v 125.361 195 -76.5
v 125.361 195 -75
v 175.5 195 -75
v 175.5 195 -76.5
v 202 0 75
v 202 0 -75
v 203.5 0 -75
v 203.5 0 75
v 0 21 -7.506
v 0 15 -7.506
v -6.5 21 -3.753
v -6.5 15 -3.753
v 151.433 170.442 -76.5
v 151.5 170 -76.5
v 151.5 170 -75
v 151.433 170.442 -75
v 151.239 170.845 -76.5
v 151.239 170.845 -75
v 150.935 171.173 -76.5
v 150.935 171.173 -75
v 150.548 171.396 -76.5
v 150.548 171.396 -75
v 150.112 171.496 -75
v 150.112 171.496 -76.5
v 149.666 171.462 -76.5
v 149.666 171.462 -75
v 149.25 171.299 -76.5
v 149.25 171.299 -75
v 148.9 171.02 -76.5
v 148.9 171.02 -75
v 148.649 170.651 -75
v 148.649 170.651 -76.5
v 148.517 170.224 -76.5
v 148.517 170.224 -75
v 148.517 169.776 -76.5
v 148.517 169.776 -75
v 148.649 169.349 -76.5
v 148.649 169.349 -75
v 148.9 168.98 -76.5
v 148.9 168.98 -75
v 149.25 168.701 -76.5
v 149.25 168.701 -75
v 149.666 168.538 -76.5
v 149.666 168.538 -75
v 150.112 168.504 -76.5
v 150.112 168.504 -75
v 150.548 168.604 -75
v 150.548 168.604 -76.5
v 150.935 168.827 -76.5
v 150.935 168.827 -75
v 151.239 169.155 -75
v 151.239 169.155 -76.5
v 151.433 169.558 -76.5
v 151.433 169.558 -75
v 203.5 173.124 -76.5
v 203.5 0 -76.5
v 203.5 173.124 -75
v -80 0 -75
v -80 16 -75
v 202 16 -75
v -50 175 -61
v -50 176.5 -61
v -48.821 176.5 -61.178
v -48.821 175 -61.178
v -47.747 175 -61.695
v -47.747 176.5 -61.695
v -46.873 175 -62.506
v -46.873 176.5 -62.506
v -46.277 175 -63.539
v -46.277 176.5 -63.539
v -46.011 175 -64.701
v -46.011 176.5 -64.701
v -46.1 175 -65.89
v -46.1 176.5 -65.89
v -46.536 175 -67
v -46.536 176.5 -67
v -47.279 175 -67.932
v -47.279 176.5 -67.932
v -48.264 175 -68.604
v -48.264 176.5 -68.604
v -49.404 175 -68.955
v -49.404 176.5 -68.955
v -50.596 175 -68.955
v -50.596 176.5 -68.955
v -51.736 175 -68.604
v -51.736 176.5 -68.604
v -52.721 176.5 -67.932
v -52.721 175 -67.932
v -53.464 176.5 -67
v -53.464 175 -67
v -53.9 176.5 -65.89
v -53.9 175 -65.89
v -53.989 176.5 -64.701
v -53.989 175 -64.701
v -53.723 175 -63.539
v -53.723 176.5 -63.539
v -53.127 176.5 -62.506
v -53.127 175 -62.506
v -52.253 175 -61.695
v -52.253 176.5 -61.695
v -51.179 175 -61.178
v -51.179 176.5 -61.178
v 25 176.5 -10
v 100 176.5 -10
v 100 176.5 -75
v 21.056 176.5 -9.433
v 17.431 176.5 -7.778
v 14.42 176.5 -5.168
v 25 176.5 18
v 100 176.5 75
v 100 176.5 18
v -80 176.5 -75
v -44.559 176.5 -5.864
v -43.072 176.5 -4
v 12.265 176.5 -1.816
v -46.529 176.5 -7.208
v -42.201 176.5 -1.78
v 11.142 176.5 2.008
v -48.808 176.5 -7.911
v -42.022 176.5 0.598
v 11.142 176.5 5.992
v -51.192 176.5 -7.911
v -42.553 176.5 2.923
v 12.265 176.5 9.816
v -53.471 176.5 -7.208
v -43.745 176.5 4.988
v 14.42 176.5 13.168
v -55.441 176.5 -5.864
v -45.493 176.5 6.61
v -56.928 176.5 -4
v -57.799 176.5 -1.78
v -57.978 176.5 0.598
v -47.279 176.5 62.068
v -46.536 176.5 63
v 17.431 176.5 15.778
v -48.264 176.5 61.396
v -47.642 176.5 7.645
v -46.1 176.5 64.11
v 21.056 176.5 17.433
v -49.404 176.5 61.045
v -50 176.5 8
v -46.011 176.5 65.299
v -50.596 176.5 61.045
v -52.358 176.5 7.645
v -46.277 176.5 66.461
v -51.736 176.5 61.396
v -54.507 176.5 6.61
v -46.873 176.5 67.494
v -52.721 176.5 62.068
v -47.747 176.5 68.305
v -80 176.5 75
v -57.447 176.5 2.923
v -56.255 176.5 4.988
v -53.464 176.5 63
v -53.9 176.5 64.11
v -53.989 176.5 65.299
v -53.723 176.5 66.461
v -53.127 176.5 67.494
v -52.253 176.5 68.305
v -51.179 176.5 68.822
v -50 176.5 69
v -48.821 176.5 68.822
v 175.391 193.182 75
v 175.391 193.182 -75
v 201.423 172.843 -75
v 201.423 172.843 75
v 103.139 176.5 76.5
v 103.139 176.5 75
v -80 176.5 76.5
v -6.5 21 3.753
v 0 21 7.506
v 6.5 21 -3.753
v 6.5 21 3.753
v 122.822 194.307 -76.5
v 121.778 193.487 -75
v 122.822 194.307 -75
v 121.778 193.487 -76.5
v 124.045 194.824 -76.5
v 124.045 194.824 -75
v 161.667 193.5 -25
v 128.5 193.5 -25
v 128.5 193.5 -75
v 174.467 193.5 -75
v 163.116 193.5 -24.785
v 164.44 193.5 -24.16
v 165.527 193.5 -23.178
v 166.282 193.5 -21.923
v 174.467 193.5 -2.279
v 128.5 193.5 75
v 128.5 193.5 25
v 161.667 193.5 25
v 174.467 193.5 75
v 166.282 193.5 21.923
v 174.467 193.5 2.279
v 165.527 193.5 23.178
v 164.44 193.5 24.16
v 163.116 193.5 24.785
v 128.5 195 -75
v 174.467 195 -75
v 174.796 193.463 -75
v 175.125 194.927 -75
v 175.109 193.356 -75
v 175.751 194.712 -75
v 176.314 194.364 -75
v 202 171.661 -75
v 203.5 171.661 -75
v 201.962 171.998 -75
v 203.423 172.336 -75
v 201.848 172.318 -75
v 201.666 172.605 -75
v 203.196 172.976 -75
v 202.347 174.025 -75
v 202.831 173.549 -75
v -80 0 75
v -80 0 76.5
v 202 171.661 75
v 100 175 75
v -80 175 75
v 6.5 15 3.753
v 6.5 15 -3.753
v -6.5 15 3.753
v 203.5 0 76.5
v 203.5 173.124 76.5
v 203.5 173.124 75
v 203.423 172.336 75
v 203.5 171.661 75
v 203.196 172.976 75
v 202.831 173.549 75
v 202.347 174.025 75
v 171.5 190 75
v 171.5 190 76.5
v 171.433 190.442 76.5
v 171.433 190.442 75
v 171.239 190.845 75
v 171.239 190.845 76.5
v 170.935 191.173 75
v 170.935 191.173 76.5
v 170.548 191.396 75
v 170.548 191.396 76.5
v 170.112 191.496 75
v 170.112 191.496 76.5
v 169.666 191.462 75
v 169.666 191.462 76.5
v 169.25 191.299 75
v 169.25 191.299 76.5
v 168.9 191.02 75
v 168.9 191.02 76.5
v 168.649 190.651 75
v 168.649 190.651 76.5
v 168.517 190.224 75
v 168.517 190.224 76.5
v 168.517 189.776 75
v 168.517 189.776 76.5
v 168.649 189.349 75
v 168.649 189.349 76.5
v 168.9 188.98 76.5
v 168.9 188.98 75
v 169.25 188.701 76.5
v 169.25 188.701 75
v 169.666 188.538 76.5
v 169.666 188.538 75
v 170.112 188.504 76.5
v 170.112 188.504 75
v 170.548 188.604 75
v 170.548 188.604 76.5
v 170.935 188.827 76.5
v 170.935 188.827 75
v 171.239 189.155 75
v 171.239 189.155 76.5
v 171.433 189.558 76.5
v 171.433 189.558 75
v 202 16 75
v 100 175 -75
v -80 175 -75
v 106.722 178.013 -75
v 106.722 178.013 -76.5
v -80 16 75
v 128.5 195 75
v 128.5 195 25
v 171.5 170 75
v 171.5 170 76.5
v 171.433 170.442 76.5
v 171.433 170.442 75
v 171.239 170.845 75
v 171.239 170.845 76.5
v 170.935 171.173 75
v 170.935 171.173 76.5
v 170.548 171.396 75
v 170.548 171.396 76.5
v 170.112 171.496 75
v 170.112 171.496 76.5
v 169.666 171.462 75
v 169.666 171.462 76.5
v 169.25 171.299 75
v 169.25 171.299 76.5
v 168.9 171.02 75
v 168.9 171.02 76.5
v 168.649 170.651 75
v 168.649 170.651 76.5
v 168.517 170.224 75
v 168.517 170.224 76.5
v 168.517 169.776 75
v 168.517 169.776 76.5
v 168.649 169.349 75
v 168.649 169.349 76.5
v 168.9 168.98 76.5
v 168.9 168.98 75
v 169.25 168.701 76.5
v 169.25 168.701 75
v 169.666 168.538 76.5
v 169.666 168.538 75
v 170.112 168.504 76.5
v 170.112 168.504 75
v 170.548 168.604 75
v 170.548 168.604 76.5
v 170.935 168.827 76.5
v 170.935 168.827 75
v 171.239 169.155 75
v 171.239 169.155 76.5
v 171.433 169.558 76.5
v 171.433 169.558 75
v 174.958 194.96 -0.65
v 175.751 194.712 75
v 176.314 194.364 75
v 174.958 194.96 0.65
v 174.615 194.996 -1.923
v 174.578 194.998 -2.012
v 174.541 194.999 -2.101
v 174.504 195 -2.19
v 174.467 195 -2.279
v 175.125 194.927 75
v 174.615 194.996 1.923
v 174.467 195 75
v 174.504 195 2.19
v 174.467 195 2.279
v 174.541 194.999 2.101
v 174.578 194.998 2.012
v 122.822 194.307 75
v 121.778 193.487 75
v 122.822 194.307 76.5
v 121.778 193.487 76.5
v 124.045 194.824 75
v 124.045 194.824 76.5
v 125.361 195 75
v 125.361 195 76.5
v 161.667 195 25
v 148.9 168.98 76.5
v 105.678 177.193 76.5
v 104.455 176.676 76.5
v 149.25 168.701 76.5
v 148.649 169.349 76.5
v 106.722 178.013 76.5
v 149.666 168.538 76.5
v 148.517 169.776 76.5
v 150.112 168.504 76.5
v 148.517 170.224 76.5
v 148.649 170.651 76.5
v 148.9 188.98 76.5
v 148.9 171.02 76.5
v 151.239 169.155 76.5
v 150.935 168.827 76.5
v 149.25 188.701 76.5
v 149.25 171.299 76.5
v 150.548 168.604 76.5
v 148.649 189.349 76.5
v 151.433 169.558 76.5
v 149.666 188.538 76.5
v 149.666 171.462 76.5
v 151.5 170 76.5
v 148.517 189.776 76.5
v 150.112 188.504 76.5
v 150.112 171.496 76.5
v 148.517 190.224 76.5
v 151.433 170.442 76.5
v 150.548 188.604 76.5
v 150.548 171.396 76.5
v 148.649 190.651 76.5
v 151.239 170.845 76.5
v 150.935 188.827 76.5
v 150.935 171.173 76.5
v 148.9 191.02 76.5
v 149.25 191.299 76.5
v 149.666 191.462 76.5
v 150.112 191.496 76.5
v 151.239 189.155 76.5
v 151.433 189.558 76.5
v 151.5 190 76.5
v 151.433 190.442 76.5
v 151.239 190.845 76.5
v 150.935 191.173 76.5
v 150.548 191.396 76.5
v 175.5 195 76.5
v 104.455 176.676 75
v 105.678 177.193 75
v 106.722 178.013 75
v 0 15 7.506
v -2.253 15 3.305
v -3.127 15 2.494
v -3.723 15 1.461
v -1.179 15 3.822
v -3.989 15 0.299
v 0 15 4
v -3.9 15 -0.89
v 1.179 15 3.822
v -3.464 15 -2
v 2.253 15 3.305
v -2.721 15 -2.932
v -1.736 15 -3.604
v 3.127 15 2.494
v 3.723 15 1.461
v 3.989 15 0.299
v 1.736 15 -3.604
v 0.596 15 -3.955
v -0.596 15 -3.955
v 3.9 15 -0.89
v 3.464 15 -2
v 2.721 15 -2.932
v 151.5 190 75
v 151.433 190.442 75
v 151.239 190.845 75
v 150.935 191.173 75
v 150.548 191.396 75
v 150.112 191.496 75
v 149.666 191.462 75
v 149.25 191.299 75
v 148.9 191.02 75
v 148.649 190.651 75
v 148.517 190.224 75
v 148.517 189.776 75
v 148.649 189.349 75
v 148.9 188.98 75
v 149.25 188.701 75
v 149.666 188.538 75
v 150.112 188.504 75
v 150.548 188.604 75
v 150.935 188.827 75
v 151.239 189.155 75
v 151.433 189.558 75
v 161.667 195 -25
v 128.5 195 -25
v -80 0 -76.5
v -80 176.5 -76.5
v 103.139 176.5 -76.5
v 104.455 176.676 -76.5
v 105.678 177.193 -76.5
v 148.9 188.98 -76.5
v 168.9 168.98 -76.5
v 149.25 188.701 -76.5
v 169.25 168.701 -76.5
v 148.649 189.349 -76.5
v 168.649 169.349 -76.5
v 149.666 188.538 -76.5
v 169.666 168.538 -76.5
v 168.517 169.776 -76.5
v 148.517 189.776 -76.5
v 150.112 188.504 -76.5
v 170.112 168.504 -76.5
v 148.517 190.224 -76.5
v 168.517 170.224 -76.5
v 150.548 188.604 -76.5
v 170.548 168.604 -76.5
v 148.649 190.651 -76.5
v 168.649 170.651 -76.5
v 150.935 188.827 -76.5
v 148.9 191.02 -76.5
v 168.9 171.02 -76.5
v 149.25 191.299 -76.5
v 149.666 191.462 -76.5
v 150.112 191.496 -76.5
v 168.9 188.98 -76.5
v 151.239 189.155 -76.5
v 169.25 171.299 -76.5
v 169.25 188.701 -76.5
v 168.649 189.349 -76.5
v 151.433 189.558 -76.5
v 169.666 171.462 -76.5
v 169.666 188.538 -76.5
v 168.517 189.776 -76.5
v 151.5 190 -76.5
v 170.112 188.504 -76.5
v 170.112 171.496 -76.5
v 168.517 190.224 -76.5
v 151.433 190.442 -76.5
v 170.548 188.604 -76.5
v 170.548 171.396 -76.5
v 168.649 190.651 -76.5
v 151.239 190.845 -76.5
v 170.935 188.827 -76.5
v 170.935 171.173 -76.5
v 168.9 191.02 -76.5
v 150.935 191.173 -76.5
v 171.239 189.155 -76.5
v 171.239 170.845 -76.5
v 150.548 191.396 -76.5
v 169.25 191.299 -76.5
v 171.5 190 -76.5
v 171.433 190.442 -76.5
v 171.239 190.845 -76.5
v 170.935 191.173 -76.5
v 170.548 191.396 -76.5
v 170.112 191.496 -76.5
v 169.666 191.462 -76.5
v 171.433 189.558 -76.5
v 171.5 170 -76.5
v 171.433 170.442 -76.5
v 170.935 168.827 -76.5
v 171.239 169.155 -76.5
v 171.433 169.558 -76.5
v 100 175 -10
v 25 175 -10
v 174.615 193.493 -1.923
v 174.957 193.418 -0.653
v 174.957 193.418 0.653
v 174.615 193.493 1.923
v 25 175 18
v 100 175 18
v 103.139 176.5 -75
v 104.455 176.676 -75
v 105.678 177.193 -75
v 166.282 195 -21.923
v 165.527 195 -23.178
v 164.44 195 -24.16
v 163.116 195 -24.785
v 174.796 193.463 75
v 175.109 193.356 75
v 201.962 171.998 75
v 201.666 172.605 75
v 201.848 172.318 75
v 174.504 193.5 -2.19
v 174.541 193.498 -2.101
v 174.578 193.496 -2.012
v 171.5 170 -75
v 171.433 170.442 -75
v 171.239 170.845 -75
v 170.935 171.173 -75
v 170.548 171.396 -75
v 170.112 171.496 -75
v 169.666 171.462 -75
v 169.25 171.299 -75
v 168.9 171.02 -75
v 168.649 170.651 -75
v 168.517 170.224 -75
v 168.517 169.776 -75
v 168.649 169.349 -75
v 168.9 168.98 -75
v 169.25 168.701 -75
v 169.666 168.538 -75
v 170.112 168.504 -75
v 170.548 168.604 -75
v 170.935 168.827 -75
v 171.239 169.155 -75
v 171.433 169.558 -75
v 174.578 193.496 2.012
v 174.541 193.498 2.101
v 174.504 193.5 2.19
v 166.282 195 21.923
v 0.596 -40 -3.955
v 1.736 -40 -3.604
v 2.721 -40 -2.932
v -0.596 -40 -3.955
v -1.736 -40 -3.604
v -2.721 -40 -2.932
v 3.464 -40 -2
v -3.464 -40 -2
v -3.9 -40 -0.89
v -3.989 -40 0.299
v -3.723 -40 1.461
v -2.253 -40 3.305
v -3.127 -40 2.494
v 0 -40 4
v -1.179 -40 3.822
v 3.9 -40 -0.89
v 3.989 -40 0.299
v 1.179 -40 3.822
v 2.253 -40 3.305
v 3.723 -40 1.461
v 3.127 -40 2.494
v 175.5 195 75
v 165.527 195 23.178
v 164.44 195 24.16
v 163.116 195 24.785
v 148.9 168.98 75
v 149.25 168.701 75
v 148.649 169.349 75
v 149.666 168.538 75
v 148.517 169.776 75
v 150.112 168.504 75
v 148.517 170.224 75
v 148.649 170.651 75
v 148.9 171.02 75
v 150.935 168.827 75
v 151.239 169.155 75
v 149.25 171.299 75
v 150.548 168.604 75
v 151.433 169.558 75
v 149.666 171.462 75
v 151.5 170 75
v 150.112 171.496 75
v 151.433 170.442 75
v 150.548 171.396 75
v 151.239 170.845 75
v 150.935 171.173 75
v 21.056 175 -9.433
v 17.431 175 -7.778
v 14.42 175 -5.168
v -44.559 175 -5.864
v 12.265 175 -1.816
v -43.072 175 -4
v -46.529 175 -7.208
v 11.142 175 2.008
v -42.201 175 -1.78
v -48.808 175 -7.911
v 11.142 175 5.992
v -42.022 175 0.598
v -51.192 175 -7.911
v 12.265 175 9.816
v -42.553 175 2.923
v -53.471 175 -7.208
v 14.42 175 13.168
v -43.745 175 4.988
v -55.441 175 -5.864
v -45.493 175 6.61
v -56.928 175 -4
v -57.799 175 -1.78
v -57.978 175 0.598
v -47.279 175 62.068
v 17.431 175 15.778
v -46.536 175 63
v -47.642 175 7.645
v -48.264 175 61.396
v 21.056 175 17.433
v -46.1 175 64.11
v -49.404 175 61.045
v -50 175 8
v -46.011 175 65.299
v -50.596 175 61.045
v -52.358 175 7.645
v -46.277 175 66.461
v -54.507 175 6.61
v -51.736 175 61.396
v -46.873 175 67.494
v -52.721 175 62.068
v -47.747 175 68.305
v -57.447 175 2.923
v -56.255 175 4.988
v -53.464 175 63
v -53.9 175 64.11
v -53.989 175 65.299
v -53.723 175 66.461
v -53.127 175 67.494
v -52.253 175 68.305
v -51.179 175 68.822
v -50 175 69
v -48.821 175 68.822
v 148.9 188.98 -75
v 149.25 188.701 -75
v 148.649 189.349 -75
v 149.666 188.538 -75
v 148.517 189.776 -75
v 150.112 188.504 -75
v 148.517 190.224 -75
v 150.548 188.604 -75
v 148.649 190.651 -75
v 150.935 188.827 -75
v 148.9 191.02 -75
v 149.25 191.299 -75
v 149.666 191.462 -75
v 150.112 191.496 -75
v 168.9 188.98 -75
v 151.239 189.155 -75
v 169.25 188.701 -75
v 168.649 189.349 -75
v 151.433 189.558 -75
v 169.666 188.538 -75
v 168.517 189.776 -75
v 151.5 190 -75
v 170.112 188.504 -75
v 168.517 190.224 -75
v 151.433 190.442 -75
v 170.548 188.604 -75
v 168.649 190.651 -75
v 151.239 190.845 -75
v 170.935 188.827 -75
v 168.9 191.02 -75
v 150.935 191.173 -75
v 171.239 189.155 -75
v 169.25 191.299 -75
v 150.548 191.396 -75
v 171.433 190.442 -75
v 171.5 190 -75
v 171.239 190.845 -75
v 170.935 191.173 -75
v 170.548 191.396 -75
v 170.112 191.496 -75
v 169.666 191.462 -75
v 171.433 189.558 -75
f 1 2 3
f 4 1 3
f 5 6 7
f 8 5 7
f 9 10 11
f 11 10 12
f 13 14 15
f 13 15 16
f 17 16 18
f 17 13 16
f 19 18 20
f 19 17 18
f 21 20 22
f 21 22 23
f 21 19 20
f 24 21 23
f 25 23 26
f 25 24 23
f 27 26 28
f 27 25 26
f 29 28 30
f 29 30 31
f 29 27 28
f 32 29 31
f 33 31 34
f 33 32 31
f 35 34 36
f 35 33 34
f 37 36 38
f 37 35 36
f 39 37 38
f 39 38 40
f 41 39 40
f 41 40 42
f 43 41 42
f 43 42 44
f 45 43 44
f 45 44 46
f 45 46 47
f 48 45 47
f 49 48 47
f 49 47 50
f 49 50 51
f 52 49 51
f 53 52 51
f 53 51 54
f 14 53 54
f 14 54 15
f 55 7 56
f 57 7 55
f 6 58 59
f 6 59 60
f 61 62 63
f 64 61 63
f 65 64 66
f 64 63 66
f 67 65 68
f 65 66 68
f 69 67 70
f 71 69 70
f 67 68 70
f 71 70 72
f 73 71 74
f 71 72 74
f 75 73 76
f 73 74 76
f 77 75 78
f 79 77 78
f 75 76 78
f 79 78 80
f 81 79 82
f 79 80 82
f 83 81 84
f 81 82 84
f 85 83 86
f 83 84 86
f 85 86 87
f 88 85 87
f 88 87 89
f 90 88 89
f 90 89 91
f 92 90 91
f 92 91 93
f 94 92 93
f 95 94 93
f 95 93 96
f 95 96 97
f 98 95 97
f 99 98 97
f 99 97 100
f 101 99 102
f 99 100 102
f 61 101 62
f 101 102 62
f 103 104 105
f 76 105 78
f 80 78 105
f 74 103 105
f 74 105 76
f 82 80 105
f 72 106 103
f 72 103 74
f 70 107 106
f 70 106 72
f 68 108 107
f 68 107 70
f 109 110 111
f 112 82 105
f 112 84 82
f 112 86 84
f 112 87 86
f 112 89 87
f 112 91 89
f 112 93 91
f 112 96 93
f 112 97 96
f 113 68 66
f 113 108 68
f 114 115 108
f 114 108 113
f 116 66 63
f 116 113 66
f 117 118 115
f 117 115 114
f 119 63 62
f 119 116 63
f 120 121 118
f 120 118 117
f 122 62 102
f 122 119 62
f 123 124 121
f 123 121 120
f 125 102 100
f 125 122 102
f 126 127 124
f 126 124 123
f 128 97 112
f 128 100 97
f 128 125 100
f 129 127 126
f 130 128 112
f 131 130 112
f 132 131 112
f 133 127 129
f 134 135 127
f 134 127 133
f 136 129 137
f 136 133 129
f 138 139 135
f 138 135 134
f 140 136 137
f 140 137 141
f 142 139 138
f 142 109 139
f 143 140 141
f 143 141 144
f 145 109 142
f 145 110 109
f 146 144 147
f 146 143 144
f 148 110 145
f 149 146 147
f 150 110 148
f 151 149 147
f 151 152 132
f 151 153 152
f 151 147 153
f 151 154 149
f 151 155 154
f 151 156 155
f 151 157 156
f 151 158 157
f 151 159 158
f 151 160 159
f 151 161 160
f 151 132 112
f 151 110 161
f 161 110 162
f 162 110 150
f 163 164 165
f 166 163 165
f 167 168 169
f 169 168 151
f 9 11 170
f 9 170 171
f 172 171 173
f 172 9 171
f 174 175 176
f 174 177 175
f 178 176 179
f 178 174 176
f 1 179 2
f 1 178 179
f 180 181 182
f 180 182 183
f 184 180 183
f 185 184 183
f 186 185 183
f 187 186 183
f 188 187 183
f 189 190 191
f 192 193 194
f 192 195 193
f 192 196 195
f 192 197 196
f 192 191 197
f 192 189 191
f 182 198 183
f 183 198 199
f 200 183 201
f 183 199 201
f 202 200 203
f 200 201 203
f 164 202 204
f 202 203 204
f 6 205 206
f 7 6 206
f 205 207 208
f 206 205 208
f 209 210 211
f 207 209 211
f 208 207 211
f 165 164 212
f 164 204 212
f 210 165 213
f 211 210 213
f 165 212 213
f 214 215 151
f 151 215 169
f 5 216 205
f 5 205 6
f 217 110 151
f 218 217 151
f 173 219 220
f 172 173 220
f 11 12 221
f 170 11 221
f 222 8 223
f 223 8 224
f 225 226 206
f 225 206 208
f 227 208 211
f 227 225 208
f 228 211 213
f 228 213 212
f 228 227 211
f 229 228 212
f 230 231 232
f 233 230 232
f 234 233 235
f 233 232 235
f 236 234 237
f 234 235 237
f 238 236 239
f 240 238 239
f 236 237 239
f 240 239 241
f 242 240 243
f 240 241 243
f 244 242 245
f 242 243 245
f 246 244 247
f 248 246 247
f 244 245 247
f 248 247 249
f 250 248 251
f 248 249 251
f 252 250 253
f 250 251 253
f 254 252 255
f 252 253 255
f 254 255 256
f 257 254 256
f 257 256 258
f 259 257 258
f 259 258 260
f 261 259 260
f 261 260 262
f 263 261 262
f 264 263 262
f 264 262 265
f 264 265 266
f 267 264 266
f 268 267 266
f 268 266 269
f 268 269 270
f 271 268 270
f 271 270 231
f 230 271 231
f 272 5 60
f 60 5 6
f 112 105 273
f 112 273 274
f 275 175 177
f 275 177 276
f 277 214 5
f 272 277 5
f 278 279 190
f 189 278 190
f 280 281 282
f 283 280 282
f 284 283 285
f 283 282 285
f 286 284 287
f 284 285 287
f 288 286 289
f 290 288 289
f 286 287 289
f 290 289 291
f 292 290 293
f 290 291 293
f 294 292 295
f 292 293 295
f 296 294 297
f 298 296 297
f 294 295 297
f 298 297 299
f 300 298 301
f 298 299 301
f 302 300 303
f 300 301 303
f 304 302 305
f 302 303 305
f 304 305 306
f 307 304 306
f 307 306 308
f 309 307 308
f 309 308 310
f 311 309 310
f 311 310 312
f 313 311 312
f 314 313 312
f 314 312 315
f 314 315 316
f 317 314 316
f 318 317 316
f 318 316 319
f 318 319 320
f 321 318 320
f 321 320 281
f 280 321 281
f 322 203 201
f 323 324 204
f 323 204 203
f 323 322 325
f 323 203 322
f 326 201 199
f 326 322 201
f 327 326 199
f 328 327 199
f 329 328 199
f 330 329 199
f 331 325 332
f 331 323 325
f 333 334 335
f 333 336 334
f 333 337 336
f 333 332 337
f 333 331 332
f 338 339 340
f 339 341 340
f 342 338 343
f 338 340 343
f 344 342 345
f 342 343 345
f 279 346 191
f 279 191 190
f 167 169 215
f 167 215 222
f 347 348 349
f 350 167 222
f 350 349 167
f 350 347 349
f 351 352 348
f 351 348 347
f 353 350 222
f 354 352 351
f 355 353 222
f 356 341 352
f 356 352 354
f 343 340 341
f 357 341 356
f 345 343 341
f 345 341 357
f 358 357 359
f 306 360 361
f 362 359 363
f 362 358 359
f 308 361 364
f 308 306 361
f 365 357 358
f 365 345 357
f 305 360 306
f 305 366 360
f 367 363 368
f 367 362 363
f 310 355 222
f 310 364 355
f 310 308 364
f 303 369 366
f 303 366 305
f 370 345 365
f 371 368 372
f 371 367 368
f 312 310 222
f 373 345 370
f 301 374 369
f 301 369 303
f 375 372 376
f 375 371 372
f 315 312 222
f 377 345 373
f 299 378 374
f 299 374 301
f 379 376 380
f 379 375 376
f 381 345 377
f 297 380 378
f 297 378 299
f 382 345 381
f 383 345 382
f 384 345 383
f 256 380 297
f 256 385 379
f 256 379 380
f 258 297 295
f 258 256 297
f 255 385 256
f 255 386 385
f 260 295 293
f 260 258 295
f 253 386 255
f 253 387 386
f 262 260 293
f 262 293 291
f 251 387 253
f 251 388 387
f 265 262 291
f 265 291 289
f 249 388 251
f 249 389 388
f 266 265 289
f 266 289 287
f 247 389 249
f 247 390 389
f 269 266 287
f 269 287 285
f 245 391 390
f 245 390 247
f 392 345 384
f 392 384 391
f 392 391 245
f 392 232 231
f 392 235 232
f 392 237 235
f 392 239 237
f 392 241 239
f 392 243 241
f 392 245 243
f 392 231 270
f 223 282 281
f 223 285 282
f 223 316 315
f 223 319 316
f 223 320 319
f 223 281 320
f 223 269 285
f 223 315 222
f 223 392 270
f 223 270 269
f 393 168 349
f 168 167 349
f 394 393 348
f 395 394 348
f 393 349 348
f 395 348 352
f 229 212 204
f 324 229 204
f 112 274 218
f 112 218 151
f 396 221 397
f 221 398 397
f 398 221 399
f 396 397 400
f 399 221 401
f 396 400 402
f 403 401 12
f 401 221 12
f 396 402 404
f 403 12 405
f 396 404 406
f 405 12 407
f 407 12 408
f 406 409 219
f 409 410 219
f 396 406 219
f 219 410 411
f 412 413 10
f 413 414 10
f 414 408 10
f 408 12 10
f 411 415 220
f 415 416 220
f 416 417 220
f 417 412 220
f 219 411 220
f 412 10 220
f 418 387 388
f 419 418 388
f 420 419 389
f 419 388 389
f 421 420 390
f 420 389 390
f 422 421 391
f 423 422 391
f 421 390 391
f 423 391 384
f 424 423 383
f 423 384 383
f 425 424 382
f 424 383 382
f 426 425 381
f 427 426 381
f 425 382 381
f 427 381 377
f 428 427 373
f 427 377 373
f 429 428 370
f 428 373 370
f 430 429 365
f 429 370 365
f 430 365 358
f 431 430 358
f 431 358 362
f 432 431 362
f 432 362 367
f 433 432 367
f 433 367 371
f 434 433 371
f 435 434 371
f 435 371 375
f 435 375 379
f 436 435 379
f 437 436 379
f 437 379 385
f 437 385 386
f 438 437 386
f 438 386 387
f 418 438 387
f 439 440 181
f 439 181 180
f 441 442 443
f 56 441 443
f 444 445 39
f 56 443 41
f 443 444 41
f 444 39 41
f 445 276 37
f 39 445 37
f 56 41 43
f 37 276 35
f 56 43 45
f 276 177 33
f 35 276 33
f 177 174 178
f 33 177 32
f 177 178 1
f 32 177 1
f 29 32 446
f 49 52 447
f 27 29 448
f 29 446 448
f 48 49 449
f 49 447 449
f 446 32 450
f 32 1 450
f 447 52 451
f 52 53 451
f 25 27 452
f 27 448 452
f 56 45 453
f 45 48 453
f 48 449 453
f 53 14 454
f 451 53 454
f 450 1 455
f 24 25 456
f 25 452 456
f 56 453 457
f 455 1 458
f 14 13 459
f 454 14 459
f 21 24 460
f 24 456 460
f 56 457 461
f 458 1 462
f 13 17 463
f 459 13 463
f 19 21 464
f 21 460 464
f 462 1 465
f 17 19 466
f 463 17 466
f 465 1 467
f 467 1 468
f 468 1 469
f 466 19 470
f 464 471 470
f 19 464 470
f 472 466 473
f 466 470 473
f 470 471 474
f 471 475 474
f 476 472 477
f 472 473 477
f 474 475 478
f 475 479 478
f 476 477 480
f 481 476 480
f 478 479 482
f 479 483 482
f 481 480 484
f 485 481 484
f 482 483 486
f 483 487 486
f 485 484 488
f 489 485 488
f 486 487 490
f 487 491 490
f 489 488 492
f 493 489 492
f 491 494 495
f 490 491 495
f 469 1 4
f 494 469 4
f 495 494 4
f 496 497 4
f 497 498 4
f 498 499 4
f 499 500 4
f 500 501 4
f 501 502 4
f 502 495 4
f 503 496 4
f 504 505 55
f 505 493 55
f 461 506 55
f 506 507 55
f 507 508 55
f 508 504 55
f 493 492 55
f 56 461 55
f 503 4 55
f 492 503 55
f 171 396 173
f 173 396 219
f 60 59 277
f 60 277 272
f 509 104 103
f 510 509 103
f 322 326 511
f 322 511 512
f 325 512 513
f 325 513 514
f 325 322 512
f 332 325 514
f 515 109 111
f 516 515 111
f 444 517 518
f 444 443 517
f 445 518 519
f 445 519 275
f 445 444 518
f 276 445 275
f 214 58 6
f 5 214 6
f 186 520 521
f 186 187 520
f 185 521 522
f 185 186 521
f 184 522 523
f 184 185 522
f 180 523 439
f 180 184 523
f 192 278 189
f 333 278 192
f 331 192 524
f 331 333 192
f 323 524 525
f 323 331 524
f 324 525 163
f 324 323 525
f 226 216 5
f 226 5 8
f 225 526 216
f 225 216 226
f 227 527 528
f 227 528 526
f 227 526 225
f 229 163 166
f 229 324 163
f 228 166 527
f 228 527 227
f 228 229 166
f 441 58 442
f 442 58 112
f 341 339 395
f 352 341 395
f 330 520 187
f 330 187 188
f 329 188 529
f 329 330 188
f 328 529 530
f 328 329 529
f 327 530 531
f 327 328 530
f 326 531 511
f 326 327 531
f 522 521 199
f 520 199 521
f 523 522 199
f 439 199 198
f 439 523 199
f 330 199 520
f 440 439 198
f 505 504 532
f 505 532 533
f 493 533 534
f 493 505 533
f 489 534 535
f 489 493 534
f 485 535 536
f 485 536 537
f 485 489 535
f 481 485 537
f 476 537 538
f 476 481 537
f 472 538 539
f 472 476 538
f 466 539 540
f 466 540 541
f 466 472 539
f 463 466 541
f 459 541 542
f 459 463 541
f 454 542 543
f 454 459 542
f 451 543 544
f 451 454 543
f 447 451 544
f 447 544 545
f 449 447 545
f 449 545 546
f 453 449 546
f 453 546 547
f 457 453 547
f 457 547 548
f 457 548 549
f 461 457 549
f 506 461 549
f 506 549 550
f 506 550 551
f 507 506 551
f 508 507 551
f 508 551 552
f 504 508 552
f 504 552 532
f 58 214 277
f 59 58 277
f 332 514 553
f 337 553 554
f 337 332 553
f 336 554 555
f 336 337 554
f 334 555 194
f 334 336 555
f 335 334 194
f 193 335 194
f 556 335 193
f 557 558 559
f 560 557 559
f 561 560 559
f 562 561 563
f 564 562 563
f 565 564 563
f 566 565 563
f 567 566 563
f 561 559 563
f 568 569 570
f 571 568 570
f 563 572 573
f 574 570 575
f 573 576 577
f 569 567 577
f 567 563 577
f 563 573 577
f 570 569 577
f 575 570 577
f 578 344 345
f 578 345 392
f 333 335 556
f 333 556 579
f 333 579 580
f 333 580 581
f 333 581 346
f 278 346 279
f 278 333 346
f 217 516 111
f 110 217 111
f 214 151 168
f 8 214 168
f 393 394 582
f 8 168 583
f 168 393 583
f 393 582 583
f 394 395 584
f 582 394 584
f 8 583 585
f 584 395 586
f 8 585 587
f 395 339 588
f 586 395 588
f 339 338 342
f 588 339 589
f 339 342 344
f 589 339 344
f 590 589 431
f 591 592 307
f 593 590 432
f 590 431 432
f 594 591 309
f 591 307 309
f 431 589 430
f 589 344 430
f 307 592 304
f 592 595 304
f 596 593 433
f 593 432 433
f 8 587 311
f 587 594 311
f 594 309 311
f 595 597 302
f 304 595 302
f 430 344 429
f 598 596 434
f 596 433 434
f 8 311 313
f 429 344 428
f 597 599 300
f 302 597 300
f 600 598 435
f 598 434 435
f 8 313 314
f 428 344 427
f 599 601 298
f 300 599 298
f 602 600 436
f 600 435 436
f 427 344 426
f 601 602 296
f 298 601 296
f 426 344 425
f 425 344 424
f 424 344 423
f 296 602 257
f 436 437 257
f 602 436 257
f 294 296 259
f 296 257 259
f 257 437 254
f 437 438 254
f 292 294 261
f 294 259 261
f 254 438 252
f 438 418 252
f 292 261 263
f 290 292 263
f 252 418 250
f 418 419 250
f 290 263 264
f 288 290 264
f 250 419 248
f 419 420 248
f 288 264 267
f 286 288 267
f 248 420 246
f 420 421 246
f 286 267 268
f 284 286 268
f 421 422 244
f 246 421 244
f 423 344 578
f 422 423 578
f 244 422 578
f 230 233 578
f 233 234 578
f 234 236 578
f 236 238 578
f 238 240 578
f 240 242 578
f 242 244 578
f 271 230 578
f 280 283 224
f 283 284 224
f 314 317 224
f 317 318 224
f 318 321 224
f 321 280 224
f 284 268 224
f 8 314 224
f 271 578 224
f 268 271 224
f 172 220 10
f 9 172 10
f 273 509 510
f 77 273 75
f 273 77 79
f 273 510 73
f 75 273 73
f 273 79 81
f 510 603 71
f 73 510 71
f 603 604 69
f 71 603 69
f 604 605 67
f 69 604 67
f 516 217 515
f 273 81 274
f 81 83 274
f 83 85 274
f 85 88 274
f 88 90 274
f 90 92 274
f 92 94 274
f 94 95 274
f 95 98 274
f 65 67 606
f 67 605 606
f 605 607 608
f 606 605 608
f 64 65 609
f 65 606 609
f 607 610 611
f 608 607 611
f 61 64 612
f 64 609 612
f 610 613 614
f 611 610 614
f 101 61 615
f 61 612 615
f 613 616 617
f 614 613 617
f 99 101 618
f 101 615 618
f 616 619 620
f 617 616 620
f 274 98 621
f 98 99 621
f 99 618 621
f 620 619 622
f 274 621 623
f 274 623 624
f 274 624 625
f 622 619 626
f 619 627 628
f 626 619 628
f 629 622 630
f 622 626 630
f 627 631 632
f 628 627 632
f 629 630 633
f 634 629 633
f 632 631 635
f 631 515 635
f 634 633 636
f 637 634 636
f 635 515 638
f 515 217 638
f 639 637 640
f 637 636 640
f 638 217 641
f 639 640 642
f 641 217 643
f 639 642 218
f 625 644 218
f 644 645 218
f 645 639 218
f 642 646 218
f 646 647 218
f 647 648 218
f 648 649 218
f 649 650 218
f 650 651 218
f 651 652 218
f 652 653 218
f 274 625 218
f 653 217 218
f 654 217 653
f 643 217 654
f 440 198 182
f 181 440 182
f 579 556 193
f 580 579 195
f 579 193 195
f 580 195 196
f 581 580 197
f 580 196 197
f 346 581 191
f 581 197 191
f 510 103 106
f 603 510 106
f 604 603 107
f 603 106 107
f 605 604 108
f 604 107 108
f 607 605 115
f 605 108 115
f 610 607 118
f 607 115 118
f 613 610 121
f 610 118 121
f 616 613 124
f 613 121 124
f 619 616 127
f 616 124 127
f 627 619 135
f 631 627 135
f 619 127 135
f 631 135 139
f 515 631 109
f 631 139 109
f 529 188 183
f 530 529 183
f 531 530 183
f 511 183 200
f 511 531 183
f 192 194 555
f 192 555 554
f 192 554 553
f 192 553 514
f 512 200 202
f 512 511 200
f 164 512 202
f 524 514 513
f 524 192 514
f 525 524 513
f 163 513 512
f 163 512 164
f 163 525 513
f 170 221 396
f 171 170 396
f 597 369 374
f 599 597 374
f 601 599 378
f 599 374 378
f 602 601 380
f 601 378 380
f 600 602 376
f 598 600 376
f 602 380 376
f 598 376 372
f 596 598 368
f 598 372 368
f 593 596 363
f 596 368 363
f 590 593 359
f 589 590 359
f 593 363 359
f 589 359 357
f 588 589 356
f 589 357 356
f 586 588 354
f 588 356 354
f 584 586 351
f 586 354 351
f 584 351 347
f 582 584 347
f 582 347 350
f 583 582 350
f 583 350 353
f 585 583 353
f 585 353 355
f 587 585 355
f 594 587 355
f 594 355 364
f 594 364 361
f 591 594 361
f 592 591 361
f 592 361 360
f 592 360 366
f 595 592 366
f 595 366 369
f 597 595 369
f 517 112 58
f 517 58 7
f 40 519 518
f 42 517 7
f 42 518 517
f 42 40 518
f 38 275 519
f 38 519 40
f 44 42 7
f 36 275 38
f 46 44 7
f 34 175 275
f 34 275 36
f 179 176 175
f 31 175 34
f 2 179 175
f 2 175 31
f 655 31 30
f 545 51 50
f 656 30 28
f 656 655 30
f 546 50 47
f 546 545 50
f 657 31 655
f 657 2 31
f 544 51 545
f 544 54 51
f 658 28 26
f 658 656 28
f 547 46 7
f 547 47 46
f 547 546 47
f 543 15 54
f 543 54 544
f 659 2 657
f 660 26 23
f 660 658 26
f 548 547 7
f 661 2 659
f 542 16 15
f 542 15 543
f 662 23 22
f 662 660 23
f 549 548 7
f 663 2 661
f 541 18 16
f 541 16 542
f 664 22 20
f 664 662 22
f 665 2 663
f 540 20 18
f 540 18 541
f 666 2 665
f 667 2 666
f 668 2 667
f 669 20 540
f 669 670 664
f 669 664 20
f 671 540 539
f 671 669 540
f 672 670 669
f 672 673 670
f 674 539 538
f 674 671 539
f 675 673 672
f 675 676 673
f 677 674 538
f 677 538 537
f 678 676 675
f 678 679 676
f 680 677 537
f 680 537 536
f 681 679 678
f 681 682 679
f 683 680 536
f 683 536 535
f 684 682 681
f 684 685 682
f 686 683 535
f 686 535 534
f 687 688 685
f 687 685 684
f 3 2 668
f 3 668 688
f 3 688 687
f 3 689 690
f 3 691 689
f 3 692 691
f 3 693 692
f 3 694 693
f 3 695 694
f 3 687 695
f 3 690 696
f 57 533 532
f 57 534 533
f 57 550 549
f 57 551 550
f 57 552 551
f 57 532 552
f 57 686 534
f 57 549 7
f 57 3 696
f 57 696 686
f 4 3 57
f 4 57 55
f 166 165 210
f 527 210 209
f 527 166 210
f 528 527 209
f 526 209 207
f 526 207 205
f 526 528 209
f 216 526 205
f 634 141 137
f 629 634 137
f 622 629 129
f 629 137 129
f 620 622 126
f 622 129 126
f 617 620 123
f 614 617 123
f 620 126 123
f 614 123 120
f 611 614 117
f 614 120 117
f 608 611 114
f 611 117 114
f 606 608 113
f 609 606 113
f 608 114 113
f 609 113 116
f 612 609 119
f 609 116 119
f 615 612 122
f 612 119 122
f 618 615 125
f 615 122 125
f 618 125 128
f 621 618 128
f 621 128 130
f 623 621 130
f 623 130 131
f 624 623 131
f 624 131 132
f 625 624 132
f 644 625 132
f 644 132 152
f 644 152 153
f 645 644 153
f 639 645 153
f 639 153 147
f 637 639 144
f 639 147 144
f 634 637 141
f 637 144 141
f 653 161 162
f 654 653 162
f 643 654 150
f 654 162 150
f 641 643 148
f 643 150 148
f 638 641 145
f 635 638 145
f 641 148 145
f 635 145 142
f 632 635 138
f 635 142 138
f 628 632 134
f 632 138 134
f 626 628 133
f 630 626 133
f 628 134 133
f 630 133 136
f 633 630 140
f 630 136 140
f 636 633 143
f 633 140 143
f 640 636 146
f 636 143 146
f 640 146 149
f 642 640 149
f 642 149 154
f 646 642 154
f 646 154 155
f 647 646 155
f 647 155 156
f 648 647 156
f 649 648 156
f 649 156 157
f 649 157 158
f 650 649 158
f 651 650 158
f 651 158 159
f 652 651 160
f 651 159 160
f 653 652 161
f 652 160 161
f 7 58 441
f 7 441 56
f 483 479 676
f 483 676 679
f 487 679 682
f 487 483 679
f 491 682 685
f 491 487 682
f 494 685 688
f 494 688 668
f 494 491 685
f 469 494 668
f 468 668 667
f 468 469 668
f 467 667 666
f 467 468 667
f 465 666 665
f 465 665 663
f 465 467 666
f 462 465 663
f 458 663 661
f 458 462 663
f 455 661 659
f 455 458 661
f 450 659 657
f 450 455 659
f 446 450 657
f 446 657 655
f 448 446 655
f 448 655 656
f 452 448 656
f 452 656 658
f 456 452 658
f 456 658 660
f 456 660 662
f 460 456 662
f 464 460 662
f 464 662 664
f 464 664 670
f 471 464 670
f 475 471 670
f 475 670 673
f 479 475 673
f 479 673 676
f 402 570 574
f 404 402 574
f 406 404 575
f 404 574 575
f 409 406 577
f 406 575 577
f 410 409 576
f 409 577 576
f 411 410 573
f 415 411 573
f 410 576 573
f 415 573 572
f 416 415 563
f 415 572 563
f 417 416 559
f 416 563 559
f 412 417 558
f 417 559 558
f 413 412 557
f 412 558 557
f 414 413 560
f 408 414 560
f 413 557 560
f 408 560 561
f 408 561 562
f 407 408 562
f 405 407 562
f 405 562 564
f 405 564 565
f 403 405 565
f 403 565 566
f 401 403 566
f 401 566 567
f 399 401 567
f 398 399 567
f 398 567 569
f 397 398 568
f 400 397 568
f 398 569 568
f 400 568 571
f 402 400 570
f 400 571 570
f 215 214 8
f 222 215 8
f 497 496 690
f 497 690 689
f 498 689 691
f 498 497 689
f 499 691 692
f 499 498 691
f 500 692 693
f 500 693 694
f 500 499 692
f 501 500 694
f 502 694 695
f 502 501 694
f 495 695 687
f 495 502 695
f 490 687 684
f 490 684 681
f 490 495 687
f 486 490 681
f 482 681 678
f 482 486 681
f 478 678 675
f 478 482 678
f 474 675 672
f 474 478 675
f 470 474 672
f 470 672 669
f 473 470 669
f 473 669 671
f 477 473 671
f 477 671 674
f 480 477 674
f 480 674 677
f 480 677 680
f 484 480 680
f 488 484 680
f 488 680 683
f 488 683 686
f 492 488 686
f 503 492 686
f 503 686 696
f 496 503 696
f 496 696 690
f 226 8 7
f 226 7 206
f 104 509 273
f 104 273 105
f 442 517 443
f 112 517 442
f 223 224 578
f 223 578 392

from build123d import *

# Parameters (mm, degrees)
BOSS_EXTRU_1_DEPTH        = 15
BOSS_EXTRU_1_DEPTH_BACK   = 40
ESQUISSE1_R               = 4
ESQUISSE2_W               = 420
ESQUISSE2_H               = 150
BOSS_EXTRU_2_DEPTH        = 16
BOSS_EXTRU_3_DEPTH        = 6
ESQUISSE5_W               = 421.5
ESQUISSE5_H               = 195
BOSS_EXTRU_4_DEPTH        = 1.5
T_LE_DE_BASE_PLI_E1_DEPTH = 150
ESQUISSE11_R              = 1.5
ENL_V_MAT_EXTRU_1_DEPTH   = 330.395279262
ENL_V_MAT_EXTRU_2_DEPTH   = 5
CONG_1_R                  = 5
ESQUISSE13_W              = 180
ESQUISSE13_H              = 1.5
T_LE_DE_BASE_PLI_E2_DEPTH = 150
ENL_V_MAT_EXTRU_4_DEPTH   = 329.70807728
CONG_3_R                  = 5
CHANFREIN1_SIZE           = 28
CHANFREIN1_SIZE2          = 21.875997542
ENL_V_MAT_EXTRU_3_DEPTH   = 1.5
ESQUISSE18_R              = 8
ESQUISSE18_R_2            = 4
ENL_V_MAT_EXTRU_5_DEPTH   = 1.5
ESQUISSE19_W              = 138
ESQUISSE19_H              = 176.5
ENL_V_MAT_EXTRU_6_DEPTH   = 331.087867149


# Sheet-metal steps are written as plain solids
with BuildPart() as part:
    # Esquisse1 → Boss.-Extru.1 (new, two sides: drawn at the far end of the back side and taken through both)
    with BuildSketch(Plane(origin=(0, 0, 0), x_dir=(1, 0, 0), z_dir=(0, 1, 0)).offset(-BOSS_EXTRU_1_DEPTH_BACK)):
        with Locations(Location((0, 0, 0), (0, 0, 270))):
            Circle(ESQUISSE1_R)
    extrude(amount=BOSS_EXTRU_1_DEPTH + BOSS_EXTRU_1_DEPTH_BACK)

    # Esquisse4 → Boss.-Extru.3 (add)
    with BuildSketch(Plane(origin=(0, 15, 0), x_dir=(1, 0, 0), z_dir=(0, 1, 0))):
        Polygon((6.5, 3.75277675), (0, 7.505553499), (-6.5, 3.75277675), (-6.5, -3.75277675), (0, -7.505553499), (6.5, -3.75277675), align=None)
    extrude(amount=BOSS_EXTRU_3_DEPTH)


with BuildPart() as body_2:
    # Esquisse2 → Boss.-Extru.2 (new body)
    with BuildSketch(Plane(origin=(0, 0, 0), x_dir=(1, 0, 0), z_dir=(0, 1, 0))):
        with Locations((-8, 0)):
            Rectangle(ESQUISSE2_W, ESQUISSE2_H)
    extrude(amount=BOSS_EXTRU_2_DEPTH)


with BuildPart() as body_3:
    # Esquisse5 → Boss.-Extru.4 (new body)
    with BuildSketch(Plane.XY.offset(75)):
        with Locations((-7.25, 97.5)):
            Rectangle(ESQUISSE5_W, ESQUISSE5_H)
    extrude(amount=BOSS_EXTRU_4_DEPTH)

    # Esquisse11 → Enlèv. mat.-Extru.1 (cut, through all)
    with BuildSketch(Plane.XY.offset(76.5)):
        with Locations((150, 190)):
            Circle(ESQUISSE11_R)
        with Locations((150, 170)):
            Circle(ESQUISSE11_R)
        with Locations((170, 170)):
            Circle(ESQUISSE11_R)
        with Locations((170, 190)):
            Circle(ESQUISSE11_R)
    extrude(amount=-ENL_V_MAT_EXTRU_1_DEPTH, mode=Mode.SUBTRACT)

    # Esquisse17 → Enlèv. mat.-Extru.4 (cut, through all)
    with BuildSketch(Plane(origin=(0, 0, 75), x_dir=(-1, 0, 0), z_dir=(0, 0, -1))):
        Polygon((-123.25, 195), (-105.25, 176.5), (218, 176.5), (218, 195), align=None)
    extrude(amount=-ENL_V_MAT_EXTRU_4_DEPTH, mode=Mode.SUBTRACT)

    # Congé3
    cong_3_edges = [body_3.edges().sort_by_distance(p)[0] for p in [
        (123.25, 195, 75.75),
        (105.25, 176.5, 75.75),
    ]]
    fillet(cong_3_edges, radius=CONG_3_R)

    # Chanfrein1
    chanfrein1_edges = [body_3.edges().sort_by_distance(p)[0] for p in [
        (203.5, 195, 75.75),
    ]]
    chanfrein1_side = [body_3.faces().sort_by_distance(p)[0] for p in [
        (164.430651216, 195, 75.75),
    ]]
    chamfer(chanfrein1_edges, length=CHANFREIN1_SIZE, length2=CHANFREIN1_SIZE2, reference=chanfrein1_side[0])


with BuildPart() as body_4:
    # Esquisse6 → Tôle de base pliée1 (new body)
    with BuildSketch(Plane(origin=(0, 0, 75), x_dir=(-1, 0, 0), z_dir=(0, 0, -1))):
        with BuildLine():
            Line((-203.5, 0), (-203.5, 171.660804692))
            ThreePointArc((-203.5, 171.660804692), (-203.196382139, 172.975918132), (-202.346984426, 174.024836953))
            Line((-202.346984426, 174.024836953), (-176.314001586, 194.364032261))
            ThreePointArc((-176.314001586, 194.364032261), (-175.443721624, 194.836555727), (-174.46701716, 195))
            Line((-174.46701716, 195), (-128.5, 195))
            Line((-128.5, 195), (-128.5, 193.5))
            Line((-128.5, 193.5), (-174.46701716, 193.5))
            ThreePointArc((-174.46701716, 193.5), (-174.955369392, 193.418277863), (-175.390509373, 193.18201613))
            Line((-175.390509373, 193.18201613), (-201.423492213, 172.842820823))
            ThreePointArc((-201.423492213, 172.842820823), (-201.848191069, 172.318361412), (-202, 171.660804692))
            Line((-202, 171.660804692), (-202, 0))
            Line((-202, 0), (-203.5, 0))
        make_face()
    extrude(amount=T_LE_DE_BASE_PLI_E1_DEPTH)

    # Esquisse12 → Enlèv. mat.-Extru.2 (cut)
    with BuildSketch(Plane(origin=(0, 195, 0), x_dir=(1, 0, 0), z_dir=(0, 1, 0))):
        with BuildLine():
            Line((128.5, 25), (165, 25))
            Line((165, 25), (174.615384615, 1.923076923))
            ThreePointArc((174.615384615, 1.923076923), (175, 0), (174.615384615, -1.923076923))
            Line((174.615384615, -1.923076923), (165, -25))
            Line((165, -25), (128.5, -25))
            Line((128.5, -25), (128.5, 25))
        make_face()
    extrude(amount=-ENL_V_MAT_EXTRU_2_DEPTH, mode=Mode.SUBTRACT)

    # Congé1
    cong_1_edges = [body_4.edges().sort_by_distance(p)[0] for p in [
        (165, 194.25, 25),
        (165, 194.25, -25),
    ]]
    fillet(cong_1_edges, radius=CONG_1_R)


with BuildPart() as body_5:
    # Esquisse13 → Tôle de base pliée2 (new body)
    with BuildSketch(Plane(origin=(0, 0, 75), x_dir=(-1, 0, 0), z_dir=(0, 0, -1))):
        with Locations((-10, 175.75)):
            Rectangle(ESQUISSE13_W, ESQUISSE13_H)
    extrude(amount=T_LE_DE_BASE_PLI_E2_DEPTH)

    # Esquisse16 → Enlèv. mat.-Extru.3 (cut)
    with BuildSketch(Plane(origin=(0, 176.5, 0), x_dir=(1, 0, 0), z_dir=(0, 1, 0))):
        with BuildLine():
            Line((100, 10), (25, 10))
            ThreePointArc((25, 10), (11, -4), (25, -18))
            Line((25, -18), (100, -18))
            Line((100, -18), (100, 10))
        make_face()
    extrude(amount=-ENL_V_MAT_EXTRU_3_DEPTH, mode=Mode.SUBTRACT)

    # Esquisse18 → Enlèv. mat.-Extru.5 (cut)
    with BuildSketch(Plane(origin=(0, 176.5, 0), x_dir=(1, 0, 0), z_dir=(0, 1, 0))):
        with Locations(Location((-50, 0, 0), (0, 0, 270))):
            Circle(ESQUISSE18_R)
        with Locations(Location((-50, -65, 0), (0, 0, 270))):
            Circle(ESQUISSE18_R_2)
        with Locations(Location((-50, 65, 0), (0, 0, 270))):
            Circle(ESQUISSE18_R_2)
    extrude(amount=-ENL_V_MAT_EXTRU_5_DEPTH, mode=Mode.SUBTRACT)


with BuildPart() as body_6:
    # Symétrie1: mirrored copy
    add(body_3.part.mirror(Plane.XY))


with BuildPart() as enl_v_mat_extru_6_tool:
    # Esquisse19 → Enlèv. mat.-Extru.6 (new, through all)
    with BuildSketch(Plane.XY.offset(76.5)):
        with Locations((-149, 88.25)):
            Rectangle(ESQUISSE19_W, ESQUISSE19_H)
    extrude(amount=-ENL_V_MAT_EXTRU_6_DEPTH)


with BuildPart() as body_2_1:
    add(body_2.part)

    # Enlèv. mat.-Extru.6: cut by enl_v_mat_extru_6_tool
    add(enl_v_mat_extru_6_tool.part, mode=Mode.SUBTRACT)


with BuildPart() as body_3_1:
    add(body_3.part)

    # Enlèv. mat.-Extru.6: cut by enl_v_mat_extru_6_tool
    add(enl_v_mat_extru_6_tool.part, mode=Mode.SUBTRACT)


with BuildPart() as body_6_1:
    add(body_6.part)

    # Enlèv. mat.-Extru.6: cut by enl_v_mat_extru_6_tool
    add(enl_v_mat_extru_6_tool.part, mode=Mode.SUBTRACT)


solid = Compound([part.part, body_4.part, body_5.part, body_2_1.part, body_3_1.part, body_6_1.part])
